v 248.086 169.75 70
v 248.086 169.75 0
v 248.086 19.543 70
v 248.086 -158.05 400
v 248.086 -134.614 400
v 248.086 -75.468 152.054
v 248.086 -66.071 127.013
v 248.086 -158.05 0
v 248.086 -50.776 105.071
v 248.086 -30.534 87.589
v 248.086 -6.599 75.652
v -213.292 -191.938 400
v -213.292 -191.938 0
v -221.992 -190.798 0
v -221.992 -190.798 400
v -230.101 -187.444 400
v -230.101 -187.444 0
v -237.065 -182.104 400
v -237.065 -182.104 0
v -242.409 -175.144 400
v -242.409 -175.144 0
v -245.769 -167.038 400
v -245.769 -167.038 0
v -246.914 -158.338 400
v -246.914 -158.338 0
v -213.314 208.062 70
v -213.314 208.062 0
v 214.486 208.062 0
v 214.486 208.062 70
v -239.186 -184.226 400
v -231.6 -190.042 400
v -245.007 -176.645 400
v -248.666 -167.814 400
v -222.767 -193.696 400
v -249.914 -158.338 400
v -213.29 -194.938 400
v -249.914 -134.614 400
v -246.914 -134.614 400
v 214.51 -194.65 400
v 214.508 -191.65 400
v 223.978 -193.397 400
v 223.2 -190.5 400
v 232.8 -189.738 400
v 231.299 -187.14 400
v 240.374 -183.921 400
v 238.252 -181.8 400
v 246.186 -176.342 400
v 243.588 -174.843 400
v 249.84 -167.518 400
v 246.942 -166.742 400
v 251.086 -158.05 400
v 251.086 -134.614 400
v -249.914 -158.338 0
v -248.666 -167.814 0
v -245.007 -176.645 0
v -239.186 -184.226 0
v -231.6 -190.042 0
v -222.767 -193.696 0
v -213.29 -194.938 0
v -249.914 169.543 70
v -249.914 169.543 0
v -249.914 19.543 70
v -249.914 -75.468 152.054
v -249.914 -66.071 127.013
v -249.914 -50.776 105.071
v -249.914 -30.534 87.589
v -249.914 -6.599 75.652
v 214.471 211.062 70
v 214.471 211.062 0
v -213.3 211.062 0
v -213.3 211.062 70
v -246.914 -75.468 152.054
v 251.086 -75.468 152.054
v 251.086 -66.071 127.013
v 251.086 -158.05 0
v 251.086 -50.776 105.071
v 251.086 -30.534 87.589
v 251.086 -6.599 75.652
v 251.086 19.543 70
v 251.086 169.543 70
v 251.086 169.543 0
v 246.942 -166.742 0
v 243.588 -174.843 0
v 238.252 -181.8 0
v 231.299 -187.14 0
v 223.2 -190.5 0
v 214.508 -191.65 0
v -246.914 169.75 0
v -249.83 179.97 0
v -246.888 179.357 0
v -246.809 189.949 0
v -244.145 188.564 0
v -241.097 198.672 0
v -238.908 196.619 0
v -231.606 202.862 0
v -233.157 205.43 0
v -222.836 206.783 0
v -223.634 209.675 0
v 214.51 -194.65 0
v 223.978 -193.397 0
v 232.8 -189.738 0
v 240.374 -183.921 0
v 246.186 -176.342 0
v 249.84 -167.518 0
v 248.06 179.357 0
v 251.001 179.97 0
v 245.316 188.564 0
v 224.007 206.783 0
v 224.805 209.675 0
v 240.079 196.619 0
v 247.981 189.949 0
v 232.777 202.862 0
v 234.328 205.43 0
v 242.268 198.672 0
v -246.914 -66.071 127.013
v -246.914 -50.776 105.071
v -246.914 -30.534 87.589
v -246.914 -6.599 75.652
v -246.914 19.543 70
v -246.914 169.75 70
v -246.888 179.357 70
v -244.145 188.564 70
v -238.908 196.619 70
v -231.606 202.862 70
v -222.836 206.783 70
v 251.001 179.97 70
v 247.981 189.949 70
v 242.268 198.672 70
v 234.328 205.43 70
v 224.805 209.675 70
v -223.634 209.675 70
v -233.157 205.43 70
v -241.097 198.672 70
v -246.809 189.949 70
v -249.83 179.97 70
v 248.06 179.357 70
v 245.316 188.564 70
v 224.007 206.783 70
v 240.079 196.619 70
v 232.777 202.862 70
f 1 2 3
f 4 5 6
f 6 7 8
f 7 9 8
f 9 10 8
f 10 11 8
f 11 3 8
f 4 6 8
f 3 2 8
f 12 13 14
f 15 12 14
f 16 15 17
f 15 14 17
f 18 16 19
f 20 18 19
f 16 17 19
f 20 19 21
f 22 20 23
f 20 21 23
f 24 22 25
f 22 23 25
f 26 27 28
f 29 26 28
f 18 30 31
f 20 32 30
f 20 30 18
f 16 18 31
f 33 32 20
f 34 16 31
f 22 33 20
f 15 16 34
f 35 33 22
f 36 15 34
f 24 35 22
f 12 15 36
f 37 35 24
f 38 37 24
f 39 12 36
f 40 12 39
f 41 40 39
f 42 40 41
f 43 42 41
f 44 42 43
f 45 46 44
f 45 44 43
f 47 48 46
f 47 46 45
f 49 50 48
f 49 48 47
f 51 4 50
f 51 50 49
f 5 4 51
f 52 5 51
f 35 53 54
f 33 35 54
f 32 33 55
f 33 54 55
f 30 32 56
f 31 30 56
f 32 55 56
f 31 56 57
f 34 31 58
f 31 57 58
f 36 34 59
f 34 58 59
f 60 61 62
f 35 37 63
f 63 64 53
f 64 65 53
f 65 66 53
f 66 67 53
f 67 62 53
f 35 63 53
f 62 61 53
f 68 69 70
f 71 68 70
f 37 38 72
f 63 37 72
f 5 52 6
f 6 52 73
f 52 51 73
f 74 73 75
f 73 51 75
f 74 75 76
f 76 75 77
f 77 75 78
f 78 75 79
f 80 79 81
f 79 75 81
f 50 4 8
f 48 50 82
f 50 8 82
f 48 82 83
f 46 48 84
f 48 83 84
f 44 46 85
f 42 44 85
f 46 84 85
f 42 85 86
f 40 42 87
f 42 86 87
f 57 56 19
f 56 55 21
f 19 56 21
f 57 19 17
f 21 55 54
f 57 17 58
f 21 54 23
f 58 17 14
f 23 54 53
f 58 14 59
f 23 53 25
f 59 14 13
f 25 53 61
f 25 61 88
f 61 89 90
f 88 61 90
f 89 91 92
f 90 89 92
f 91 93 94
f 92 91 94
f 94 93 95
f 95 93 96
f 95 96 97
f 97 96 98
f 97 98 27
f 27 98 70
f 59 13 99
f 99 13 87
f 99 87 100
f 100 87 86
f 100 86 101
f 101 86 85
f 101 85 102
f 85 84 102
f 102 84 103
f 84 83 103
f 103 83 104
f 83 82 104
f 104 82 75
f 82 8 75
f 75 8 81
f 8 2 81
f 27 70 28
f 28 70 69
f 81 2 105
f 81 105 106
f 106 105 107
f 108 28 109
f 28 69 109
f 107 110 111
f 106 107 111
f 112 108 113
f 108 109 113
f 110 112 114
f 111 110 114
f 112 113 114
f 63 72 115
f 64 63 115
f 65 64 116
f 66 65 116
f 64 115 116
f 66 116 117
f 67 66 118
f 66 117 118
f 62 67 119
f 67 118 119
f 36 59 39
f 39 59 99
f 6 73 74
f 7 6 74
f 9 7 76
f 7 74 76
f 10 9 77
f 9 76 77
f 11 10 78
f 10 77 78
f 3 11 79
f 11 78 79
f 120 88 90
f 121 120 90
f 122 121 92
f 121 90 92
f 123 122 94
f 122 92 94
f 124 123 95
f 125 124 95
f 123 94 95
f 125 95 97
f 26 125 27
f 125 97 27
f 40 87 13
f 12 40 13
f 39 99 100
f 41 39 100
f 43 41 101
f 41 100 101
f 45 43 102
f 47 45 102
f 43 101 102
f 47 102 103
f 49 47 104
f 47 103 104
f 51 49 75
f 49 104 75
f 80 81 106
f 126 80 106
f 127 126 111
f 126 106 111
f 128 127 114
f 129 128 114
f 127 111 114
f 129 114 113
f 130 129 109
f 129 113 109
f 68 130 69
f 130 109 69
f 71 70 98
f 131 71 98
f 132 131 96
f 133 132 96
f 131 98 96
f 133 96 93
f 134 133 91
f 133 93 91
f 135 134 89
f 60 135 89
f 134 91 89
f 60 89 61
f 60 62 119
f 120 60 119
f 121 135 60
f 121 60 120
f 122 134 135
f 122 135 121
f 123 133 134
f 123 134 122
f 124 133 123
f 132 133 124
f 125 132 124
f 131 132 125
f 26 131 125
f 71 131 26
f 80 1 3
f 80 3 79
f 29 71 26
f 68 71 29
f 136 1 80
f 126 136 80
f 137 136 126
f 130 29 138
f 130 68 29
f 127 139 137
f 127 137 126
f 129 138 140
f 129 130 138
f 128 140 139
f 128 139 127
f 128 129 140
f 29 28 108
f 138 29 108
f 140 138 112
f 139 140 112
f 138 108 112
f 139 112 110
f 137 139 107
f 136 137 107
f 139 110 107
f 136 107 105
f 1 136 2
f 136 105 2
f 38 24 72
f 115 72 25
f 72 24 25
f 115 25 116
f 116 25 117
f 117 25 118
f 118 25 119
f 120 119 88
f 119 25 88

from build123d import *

# Parameters (mm, degrees)
F1_DEPTH = 400
F3_DEPTH = 550
F4_DEPTH = 330


with BuildPart() as f1:
    # F0 (on Top) → F1 (new body)
    with BuildSketch(Plane.XY):
        with BuildLine():
            Line((214.4711060817, 211.0624126145), (-213.2998602418, 211.0624126145))
            ThreePointArc((-213.2998602418, 211.0624126145), (-241.0972159396, 198.6720372021), (-249.9143754115, 169.5434930316))
            Line((-249.9143754115, 169.5434930316), (-249.9143754115, -158.3375933319))
            ThreePointArc((-249.9143754115, -158.3375933319), (-239.1857706386, -184.2264108639), (-213.289735862, -194.9375833684))
            Line((-213.289735862, -194.9375833684), (214.510264138, -194.6495638067))
            ThreePointArc((214.510264138, -194.6495638067), (240.3744404519, -183.9209673287), (251.0856212514, -158.0495737702))
            Line((251.0856212514, -158.0495737702), (251.0856212514, 169.5434930316))
            ThreePointArc((251.0856212514, 169.5434930316), (242.2684617794, 198.6720372021), (214.4711060817, 211.0624126145))
        make_face()
        with BuildLine():
            ThreePointArc((-246.9143770801, 169.7504262298), (-238.9080461949, 196.6185567775), (-213.3143770801, 208.0624142831))
            Line((-213.3143770801, 208.0624142831), (214.4856229199, 208.0624142831))
            ThreePointArc((214.4856229199, 208.0624142831), (240.0792920347, 196.6185567775), (248.0856229199, 169.7504262298))
            Line((248.0856229199, 169.7504262298), (248.0856229199, -158.0495737702))
            ThreePointArc((248.0856229199, -158.0495737702), (238.2524073114, -181.8003623821), (214.5082443671, -191.6495661551))
            Line((214.5082443671, -191.6495661551), (-213.2917556329, -191.9375857169))
            ThreePointArc((-213.2917556329, -191.9375857169), (-237.065165692, -182.1043777234), (-246.9143770801, -158.3375933319))
            Line((-246.9143770801, -158.3375933319), (-246.9143770801, 169.7504262298))
        make_face(mode=Mode.SUBTRACT)
    extrude(amount=F1_DEPTH)

    # F2 (on face) → F3 (cut)
    with BuildSketch(Plane.YZ.offset(251.0856212514)):
        with BuildLine():
            Line((169.5434930316, 400), (-134.6142441034, 400))
            Line((-134.6142441034, 400), (-75.4682049155, 152.0536094904))
            ThreePointArc((-75.4682049155, 152.0536094904), (-41.2013099843, 95.6971256436), (19.5434930316, 70))
            Line((19.5434930316, 70), (169.5434930316, 70))
            Line((169.5434930316, 70), (169.5434930316, 400))
        make_face()
    extrude(amount=-F3_DEPTH, mode=Mode.SUBTRACT)

    # F4 (cut): a face of the model
    f4_faces = [f1.faces().sort_by_distance(p)[0] for p in [
        (241.8909190901, 198.3390915797, 400),
    ]]
    extrude(f4_faces, amount=-F4_DEPTH, mode=Mode.SUBTRACT)


solid = f1.part
